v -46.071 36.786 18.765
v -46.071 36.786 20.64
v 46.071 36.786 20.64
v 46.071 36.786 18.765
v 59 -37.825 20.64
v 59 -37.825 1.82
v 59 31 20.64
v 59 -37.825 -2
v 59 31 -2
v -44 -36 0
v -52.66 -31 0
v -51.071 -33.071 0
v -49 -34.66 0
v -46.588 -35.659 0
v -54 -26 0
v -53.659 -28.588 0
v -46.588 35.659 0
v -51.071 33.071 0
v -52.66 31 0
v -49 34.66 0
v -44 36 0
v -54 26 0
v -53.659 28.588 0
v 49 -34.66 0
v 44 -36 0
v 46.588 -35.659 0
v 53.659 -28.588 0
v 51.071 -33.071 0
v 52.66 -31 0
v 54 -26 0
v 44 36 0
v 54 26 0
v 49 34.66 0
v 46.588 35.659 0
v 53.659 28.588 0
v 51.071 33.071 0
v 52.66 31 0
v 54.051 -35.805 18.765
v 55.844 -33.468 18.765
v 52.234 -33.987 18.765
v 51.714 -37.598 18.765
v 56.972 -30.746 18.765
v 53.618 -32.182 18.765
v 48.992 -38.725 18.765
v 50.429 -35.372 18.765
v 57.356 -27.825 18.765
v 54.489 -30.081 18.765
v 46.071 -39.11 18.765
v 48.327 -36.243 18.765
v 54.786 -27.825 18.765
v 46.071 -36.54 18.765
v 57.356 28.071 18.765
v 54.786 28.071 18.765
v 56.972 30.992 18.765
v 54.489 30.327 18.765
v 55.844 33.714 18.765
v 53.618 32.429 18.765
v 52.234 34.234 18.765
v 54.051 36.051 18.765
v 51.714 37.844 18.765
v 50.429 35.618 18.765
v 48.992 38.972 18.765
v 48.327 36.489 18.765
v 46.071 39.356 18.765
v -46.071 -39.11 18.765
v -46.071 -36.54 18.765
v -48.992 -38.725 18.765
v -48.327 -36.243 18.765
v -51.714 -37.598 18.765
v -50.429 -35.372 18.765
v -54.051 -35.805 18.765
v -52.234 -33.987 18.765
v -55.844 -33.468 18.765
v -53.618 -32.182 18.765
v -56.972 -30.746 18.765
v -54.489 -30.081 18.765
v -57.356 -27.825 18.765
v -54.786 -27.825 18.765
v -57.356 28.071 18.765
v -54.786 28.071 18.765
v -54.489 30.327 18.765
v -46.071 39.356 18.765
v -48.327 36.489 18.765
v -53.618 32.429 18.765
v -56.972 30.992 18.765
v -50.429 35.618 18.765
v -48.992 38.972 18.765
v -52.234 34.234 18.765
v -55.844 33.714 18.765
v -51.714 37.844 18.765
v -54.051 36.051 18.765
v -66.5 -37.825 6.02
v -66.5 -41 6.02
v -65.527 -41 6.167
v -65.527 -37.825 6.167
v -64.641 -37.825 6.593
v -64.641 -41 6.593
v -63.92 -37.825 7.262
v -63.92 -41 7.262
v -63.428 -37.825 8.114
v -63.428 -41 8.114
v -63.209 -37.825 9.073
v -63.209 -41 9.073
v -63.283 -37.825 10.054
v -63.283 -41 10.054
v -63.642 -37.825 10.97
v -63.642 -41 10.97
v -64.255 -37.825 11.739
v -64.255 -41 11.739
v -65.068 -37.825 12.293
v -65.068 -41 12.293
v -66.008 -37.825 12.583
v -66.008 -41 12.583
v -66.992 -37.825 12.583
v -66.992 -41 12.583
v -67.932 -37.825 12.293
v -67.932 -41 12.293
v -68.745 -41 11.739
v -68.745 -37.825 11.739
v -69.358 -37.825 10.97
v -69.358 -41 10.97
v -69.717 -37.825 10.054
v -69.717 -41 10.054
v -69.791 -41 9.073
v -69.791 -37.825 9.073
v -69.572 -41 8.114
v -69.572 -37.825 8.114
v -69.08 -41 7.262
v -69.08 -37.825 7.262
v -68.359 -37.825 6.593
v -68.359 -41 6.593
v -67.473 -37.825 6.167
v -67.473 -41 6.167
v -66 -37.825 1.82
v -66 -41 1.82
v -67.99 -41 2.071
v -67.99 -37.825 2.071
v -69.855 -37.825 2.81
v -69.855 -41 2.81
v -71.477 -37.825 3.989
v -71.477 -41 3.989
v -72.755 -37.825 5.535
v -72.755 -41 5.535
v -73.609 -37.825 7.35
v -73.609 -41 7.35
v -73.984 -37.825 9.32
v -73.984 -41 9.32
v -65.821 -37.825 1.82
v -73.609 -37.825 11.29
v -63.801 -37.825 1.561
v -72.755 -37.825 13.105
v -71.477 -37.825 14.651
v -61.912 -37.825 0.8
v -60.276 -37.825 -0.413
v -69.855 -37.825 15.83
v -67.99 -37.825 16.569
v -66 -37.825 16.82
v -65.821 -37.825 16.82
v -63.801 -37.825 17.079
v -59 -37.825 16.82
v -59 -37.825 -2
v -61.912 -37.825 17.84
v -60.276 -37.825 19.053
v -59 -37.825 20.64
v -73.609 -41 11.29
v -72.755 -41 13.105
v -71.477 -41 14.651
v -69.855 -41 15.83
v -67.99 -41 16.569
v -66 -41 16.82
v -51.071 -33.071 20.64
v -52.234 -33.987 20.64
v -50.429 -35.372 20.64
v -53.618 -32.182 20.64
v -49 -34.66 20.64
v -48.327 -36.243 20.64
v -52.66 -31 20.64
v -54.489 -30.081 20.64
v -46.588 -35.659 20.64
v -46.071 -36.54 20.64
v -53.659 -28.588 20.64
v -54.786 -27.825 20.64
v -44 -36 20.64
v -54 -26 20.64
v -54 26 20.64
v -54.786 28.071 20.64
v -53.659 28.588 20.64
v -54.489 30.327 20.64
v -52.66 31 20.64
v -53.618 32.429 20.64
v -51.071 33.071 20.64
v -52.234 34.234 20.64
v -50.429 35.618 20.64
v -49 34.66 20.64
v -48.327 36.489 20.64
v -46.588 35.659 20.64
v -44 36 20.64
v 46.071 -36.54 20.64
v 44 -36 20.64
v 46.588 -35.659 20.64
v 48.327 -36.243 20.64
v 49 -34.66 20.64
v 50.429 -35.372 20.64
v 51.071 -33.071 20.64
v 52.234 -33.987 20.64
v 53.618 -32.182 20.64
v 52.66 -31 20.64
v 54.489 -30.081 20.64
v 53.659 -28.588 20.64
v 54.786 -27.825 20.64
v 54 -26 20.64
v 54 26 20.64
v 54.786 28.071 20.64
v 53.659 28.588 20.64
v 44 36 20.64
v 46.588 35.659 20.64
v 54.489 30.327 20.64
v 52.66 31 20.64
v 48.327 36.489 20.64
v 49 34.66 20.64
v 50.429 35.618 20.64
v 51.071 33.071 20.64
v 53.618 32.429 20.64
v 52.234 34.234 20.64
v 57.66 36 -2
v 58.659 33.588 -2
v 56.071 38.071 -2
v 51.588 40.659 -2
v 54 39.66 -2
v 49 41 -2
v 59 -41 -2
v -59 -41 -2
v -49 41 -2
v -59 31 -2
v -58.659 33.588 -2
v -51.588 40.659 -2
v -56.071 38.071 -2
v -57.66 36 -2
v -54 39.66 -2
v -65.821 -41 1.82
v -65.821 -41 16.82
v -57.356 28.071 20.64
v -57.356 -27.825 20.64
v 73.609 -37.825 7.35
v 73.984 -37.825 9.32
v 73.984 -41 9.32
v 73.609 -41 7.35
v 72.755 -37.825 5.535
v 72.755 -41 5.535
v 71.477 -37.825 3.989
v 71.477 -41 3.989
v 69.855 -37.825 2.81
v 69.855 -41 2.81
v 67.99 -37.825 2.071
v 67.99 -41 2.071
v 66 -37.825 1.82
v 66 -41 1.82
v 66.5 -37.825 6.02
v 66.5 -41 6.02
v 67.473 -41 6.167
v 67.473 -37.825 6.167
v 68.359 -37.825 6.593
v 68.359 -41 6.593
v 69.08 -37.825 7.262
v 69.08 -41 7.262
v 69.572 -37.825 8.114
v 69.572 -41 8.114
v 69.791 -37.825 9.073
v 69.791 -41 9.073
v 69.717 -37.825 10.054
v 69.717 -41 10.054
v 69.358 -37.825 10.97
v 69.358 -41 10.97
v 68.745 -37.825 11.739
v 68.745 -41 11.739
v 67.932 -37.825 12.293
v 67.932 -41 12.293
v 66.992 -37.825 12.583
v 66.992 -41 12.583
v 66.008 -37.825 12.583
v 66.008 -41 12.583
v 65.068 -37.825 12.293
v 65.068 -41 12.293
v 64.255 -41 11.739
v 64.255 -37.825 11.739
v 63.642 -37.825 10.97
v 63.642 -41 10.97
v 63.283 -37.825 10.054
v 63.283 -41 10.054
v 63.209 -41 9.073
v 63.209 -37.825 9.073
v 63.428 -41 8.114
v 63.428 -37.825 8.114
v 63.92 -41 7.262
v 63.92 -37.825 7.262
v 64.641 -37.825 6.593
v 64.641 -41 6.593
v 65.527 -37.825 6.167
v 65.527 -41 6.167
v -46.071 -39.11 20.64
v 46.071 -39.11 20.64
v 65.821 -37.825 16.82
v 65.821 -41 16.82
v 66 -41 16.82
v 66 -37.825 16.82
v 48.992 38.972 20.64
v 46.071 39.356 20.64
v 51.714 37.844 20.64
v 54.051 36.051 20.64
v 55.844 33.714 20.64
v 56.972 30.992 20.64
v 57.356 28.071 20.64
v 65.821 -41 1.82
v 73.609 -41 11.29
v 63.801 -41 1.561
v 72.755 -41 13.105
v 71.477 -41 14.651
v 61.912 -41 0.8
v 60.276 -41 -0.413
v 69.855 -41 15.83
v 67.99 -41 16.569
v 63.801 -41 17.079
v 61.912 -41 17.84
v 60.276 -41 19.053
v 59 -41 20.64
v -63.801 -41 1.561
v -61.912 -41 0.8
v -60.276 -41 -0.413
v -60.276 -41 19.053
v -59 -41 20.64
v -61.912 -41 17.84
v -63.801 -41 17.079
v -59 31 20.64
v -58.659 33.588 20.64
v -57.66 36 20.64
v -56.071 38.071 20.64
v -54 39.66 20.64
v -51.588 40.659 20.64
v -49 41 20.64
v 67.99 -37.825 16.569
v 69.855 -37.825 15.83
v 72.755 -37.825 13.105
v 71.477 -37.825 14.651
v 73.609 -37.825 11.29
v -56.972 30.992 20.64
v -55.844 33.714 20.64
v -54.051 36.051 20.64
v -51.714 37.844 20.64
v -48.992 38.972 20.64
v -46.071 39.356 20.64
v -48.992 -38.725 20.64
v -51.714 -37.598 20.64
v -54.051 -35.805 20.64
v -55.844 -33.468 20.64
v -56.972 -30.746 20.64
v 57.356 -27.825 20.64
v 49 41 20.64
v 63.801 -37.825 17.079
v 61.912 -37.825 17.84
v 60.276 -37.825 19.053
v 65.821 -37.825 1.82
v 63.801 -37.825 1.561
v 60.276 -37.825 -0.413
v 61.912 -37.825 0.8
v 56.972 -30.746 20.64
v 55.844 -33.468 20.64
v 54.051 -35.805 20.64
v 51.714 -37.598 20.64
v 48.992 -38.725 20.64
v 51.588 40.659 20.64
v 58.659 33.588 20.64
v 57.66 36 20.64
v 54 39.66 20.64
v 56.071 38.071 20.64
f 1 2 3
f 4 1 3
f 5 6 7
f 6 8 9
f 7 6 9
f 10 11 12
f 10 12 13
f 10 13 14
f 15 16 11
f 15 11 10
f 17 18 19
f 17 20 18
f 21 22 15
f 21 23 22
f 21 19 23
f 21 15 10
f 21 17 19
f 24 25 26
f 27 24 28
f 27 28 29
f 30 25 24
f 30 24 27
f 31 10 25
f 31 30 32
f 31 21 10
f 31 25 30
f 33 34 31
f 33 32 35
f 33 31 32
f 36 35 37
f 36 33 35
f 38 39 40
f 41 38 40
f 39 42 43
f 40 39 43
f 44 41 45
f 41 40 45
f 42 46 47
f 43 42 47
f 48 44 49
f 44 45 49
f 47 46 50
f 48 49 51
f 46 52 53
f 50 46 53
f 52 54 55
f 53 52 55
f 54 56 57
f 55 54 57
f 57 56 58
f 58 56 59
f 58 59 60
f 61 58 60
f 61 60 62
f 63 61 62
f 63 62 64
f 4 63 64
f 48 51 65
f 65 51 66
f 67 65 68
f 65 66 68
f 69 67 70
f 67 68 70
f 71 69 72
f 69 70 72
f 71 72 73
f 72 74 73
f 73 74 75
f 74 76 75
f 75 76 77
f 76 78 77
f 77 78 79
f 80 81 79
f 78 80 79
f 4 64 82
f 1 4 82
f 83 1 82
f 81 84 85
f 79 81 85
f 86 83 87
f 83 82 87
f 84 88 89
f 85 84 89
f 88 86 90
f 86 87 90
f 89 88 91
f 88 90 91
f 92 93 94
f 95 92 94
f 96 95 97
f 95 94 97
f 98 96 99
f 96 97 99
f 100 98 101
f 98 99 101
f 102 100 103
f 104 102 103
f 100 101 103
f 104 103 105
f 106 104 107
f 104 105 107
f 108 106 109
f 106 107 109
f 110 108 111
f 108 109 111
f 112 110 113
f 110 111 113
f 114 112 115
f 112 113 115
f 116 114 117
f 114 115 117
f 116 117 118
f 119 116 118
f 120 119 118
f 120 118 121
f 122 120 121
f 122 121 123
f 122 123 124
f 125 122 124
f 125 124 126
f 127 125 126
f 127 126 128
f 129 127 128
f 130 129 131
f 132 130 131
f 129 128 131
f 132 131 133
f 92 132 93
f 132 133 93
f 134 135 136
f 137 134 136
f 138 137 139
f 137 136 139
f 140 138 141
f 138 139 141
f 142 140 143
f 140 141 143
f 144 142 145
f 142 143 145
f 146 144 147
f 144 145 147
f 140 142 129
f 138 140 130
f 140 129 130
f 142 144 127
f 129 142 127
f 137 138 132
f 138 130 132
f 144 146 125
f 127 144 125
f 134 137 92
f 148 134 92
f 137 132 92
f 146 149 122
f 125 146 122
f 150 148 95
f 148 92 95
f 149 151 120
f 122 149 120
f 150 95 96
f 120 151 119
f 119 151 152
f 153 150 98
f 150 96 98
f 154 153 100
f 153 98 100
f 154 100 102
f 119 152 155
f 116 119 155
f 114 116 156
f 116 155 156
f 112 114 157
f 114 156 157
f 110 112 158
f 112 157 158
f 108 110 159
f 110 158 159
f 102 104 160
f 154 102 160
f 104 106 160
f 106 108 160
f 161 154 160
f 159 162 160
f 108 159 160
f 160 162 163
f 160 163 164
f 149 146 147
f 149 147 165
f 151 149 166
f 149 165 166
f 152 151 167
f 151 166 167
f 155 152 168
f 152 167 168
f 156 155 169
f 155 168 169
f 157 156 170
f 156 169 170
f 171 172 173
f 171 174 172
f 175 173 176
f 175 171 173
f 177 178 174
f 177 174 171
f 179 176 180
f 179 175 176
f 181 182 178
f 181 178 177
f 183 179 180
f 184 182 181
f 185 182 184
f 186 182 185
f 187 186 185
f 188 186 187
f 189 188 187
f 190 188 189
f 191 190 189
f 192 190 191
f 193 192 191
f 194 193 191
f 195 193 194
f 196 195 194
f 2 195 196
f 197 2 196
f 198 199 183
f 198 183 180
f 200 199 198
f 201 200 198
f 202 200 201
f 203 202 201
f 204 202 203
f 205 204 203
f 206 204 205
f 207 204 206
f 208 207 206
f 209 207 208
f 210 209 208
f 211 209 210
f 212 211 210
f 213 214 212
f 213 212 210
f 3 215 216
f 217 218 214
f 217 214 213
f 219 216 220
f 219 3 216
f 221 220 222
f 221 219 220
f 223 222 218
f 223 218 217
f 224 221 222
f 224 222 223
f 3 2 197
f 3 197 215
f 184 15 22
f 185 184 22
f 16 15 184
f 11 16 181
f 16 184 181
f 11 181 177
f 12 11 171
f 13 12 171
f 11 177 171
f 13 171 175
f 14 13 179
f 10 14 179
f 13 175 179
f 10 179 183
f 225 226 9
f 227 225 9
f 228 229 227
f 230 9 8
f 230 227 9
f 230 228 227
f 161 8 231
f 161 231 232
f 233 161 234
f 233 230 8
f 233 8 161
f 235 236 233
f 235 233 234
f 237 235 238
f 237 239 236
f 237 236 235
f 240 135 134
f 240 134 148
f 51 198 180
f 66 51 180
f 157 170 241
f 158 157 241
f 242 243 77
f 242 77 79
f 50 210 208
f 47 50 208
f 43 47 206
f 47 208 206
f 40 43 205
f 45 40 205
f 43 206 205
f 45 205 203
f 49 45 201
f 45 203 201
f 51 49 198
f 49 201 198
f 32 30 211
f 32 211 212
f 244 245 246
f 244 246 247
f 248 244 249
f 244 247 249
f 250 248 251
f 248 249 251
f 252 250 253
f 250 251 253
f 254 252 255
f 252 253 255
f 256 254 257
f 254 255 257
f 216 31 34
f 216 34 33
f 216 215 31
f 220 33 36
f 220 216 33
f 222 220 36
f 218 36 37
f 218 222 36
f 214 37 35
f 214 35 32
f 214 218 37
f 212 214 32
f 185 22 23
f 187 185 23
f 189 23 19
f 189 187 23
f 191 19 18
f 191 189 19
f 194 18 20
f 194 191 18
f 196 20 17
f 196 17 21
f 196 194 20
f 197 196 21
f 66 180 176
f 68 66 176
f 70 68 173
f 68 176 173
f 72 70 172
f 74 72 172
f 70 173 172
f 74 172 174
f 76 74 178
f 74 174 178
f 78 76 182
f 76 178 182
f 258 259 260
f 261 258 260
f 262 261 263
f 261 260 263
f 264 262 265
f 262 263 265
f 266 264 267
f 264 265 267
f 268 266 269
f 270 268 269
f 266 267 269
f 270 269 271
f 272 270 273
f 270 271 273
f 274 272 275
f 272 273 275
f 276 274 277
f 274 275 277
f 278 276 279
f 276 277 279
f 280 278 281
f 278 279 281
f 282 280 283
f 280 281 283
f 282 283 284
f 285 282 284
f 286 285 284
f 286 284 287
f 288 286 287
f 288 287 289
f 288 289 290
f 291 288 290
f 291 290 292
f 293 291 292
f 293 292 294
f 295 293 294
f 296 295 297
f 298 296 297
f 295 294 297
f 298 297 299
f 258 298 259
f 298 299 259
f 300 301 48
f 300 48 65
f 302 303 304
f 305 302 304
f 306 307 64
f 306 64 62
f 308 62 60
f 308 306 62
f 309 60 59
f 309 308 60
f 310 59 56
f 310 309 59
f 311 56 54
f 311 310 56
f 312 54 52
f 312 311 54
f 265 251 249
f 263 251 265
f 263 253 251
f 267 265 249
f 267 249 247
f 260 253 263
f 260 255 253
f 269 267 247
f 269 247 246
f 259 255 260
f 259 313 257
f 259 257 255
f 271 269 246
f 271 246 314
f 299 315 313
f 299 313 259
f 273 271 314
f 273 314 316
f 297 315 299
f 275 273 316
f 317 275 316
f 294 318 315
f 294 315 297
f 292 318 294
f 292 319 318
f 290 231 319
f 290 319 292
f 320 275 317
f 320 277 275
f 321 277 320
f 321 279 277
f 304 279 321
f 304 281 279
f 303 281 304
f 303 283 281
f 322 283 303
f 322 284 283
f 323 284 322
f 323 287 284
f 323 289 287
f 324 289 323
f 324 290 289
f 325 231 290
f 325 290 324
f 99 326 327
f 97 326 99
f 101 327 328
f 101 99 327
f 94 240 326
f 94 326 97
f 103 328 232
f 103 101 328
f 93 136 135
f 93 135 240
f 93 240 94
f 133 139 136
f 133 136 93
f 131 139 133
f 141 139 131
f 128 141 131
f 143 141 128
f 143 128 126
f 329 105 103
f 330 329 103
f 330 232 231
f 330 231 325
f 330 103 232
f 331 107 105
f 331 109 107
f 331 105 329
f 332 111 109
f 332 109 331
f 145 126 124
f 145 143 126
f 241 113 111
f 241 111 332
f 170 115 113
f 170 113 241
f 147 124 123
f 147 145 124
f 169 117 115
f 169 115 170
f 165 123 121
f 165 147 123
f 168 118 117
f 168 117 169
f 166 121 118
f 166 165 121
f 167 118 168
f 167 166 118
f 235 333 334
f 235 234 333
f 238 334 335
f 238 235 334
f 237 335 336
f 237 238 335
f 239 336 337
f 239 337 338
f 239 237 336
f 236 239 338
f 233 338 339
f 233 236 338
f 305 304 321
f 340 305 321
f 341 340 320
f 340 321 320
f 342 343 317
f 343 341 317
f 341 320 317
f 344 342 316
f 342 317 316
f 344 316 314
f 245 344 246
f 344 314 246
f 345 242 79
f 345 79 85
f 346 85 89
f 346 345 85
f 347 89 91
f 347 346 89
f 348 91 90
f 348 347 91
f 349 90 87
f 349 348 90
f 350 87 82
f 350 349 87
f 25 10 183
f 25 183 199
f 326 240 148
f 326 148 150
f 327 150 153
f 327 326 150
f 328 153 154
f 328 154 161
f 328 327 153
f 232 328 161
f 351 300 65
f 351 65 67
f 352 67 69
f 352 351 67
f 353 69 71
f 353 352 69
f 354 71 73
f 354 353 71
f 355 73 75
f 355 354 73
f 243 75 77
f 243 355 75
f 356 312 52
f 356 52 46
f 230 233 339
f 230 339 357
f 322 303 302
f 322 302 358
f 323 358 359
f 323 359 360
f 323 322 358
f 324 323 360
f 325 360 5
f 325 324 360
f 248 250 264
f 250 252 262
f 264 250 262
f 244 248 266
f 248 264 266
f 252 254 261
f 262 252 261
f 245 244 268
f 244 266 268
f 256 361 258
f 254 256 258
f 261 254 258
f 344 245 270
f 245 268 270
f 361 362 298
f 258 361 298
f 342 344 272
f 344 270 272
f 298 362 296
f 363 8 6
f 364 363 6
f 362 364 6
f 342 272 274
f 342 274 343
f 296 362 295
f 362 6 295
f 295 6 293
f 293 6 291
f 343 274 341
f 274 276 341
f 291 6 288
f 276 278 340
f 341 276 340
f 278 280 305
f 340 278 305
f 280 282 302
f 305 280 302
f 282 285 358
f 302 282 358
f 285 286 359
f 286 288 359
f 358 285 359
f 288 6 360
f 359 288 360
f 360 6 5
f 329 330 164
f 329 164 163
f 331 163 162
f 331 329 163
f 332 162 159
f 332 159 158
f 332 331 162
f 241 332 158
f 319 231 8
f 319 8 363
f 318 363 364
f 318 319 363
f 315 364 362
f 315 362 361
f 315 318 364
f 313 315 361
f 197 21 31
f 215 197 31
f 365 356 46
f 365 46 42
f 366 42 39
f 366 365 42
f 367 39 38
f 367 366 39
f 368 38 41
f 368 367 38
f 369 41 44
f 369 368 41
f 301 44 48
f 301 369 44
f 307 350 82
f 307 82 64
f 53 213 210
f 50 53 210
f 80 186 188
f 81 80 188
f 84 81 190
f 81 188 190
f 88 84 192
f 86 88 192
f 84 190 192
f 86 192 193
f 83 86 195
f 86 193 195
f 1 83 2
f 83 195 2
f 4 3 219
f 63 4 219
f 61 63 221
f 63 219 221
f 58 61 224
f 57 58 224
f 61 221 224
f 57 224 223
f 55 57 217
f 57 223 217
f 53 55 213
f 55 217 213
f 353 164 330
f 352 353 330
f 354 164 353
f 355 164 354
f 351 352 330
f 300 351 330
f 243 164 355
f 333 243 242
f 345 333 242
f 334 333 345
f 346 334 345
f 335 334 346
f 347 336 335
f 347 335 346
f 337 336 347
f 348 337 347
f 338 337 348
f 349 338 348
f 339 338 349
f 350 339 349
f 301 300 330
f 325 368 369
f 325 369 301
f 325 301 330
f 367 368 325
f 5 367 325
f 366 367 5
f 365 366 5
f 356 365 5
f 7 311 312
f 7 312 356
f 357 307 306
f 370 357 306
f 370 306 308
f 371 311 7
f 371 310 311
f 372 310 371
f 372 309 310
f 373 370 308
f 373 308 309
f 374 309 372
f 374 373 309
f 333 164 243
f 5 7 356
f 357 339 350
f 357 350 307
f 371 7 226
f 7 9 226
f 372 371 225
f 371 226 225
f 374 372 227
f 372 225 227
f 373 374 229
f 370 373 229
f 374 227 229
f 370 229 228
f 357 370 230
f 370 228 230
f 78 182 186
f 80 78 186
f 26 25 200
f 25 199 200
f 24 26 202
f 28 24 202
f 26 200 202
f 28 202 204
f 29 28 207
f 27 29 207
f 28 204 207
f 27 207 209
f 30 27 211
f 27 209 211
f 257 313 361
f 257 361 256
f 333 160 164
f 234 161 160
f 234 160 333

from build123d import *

# Parameters (mm, degrees)
SKETCH2_W           = 108
SKETCH2_H           = 72
BOSS_EXTRUDE1_DEPTH = 20.64
SHELL1_T            = 5
SKETCH3_W           = 118
SKETCH3_H           = 82
CUT_EXTRUDE1_DEPTH  = 3
SKETCH4_W           = 15
SKETCH4_H           = 15
SKETCH4_R           = 3.3
BOSS_EXTRUDE2_DEPTH = 3.175
FILLET1_R           = 10
FILLET2_R           = 8
CUT_EXTRUDE2_DEPTH  = 1.875


with BuildPart() as part:
    # Sketch2 → Boss-Extrude1 (new body)
    with BuildSketch(Plane.XY):
        Rectangle(SKETCH2_W, SKETCH2_H)
    extrude(amount=BOSS_EXTRUDE1_DEPTH)

    # Shell1
    shell1_openings = [part.faces().sort_by_distance(p)[0] for p in [
        (0, 0, 20.64),
    ]]
    offset(amount=SHELL1_T, openings=shell1_openings, kind=Kind.INTERSECTION)

    # Sketch3 → Cut-Extrude1 (cut)
    with BuildSketch(Plane(origin=(0, 0, -5), x_dir=(-1, 0, 0), z_dir=(0, 0, -1))):
        Rectangle(SKETCH3_W, SKETCH3_H)
    extrude(amount=-CUT_EXTRUDE1_DEPTH, mode=Mode.SUBTRACT)

    # Sketch4 → Boss-Extrude2 (add)
    # profile 1 of 2: a face of its own
    with BuildSketch(Plane.XZ.offset(41)):
        with Locations((-66.5, 9.32)):
            Rectangle(SKETCH4_W, SKETCH4_H)
        with Locations(Location((-66.5, 9.32, 0), (0, 0, 270))):
            Circle(SKETCH4_R, mode=Mode.SUBTRACT)
    # profile 2 of 2: a face of its own
    with BuildSketch(Plane.XZ.offset(41)):
        with Locations((66.5, 9.32)):
            Rectangle(SKETCH4_W, SKETCH4_H)
        with Locations(Location((66.5, 9.32, 0), (0, 0, 270))):
            Circle(SKETCH4_R, mode=Mode.SUBTRACT)
    extrude(amount=-BOSS_EXTRUDE2_DEPTH)

    # Fillet1
    fillet1_edges = [part.edges().sort_by_distance(p)[0] for p in [
        (54, -36, 10.32),
        (54, 36, 10.32),
        (-54, 36, 10.32),
        (-54, -36, 10.32),
        (-59, 41, 9.32),
        (59, 41, 9.32),
    ]]
    fillet(fillet1_edges, radius=FILLET1_R)

    # Fillet2
    # the kernel refuses this fillet: 8 mm, written as the material it adds along each edge
    with BuildSketch(Plane(origin=(59, -41, 16.82), x_dir=(0, 0, 1), z_dir=(0, 1, 0)), Plane(origin=(-59, -41, 1.82), x_dir=(0, 0, -1), z_dir=(0, 1, 0))) as fillet2_piece_1:
        with BuildLine():
            CenterArc((8, 6.821114278), FILLET2_R, 180, 58.499903552)
            Line((0, 6.821114278), (0, 0))
            Line((0, 0), (3.82, 0))
        make_face()
    extrude(amount=3.175)
    with BuildSketch(Plane(origin=(59, -41, 1.82), x_dir=(0, 0, -1), z_dir=(0, 1, 0)), Plane(origin=(-59, -41, 16.82), x_dir=(0, 0, 1), z_dir=(0, 1, 0))) as fillet2_piece_2:
        with BuildLine():
            CenterArc((8, -6.821114278), FILLET2_R, 121.500096448, 58.499903552)
            Line((0, -6.821114278), (0, 0))
            Line((0, 0), (3.82, 0))
        make_face()
    extrude(amount=3.175)
    # the kernel refuses this fillet: 8 mm, written as the material it takes off along each edge
    with BuildSketch(Plane(origin=(74, -61, 16.82), x_dir=(0, 0, -1), z_dir=(0, 1, 0)), Plane(origin=(-74, -61, 1.82), x_dir=(0, 0, 1), z_dir=(0, 1, 0)), Plane(origin=(-74, -61, 16.82), x_dir=(1, 0, 0), z_dir=(0, 1, 0))) as fillet2_2_piece_1:
        with BuildLine():
            CenterArc((FILLET2_R, FILLET2_R), FILLET2_R, 180, 90)
            Line((0, FILLET2_R), (0, 0))
            Line((0, 0), (FILLET2_R, 0))
        make_face()
    extrude(amount=43.175, mode=Mode.SUBTRACT)
    with BuildSketch(Plane(origin=(74, -61, 1.82), x_dir=(0, 0, 1), z_dir=(0, 1, 0))) as fillet2_2_piece_2:
        with BuildLine():
            CenterArc((FILLET2_R, -FILLET2_R), FILLET2_R, 90, 90)
            Line((0, -FILLET2_R), (0, 0))
            Line((0, 0), (FILLET2_R, 0))
        make_face()
    extrude(amount=43.175, mode=Mode.SUBTRACT)

    # Sketch5 → Cut-Extrude2 (cut)
    with BuildSketch(Plane.XY.offset(20.64)):
        with BuildLine():
            Line((46.071067812, -39.11), (-46.071067812, -39.11))
            ThreePointArc((-46.071067812, -39.11), (-54.050767838, -35.804700026), (-57.356067812, -27.825))
            Line((-57.356067812, -27.825), (-57.356067812, 28.071067812))
            ThreePointArc((-57.356067812, 28.071067812), (-54.050767838, 36.050767838), (-46.071067812, 39.356067812))
            Line((-46.071067812, 39.356067812), (46.071067812, 39.356067812))
            ThreePointArc((46.071067812, 39.356067812), (54.050767838, 36.050767838), (57.356067812, 28.071067812))
            Line((57.356067812, 28.071067812), (57.356067812, -27.825))
            ThreePointArc((57.356067812, -27.825), (54.050767838, -35.804700026), (46.071067812, -39.11))
        make_face()
        with BuildLine():
            Line((46.071067812, -36.54), (-46.071067812, -36.54))
            ThreePointArc((-46.071067812, -36.54), (-52.23350341, -33.987435598), (-54.786067812, -27.825))
            Line((-54.786067812, -27.825), (-54.786067812, 28.071067812))
            ThreePointArc((-54.786067812, 28.071067812), (-52.23350341, 34.23350341), (-46.071067812, 36.786067812))
            Line((-46.071067812, 36.786067812), (46.071067812, 36.786067812))
            ThreePointArc((46.071067812, 36.786067812), (52.23350341, 34.23350341), (54.786067812, 28.071067812))
            Line((54.786067812, 28.071067812), (54.786067812, -27.825))
            ThreePointArc((54.786067812, -27.825), (52.23350341, -33.987435598), (46.071067812, -36.54))
        make_face(mode=Mode.SUBTRACT)
    extrude(amount=-CUT_EXTRUDE2_DEPTH, mode=Mode.SUBTRACT)


solid = part.part
